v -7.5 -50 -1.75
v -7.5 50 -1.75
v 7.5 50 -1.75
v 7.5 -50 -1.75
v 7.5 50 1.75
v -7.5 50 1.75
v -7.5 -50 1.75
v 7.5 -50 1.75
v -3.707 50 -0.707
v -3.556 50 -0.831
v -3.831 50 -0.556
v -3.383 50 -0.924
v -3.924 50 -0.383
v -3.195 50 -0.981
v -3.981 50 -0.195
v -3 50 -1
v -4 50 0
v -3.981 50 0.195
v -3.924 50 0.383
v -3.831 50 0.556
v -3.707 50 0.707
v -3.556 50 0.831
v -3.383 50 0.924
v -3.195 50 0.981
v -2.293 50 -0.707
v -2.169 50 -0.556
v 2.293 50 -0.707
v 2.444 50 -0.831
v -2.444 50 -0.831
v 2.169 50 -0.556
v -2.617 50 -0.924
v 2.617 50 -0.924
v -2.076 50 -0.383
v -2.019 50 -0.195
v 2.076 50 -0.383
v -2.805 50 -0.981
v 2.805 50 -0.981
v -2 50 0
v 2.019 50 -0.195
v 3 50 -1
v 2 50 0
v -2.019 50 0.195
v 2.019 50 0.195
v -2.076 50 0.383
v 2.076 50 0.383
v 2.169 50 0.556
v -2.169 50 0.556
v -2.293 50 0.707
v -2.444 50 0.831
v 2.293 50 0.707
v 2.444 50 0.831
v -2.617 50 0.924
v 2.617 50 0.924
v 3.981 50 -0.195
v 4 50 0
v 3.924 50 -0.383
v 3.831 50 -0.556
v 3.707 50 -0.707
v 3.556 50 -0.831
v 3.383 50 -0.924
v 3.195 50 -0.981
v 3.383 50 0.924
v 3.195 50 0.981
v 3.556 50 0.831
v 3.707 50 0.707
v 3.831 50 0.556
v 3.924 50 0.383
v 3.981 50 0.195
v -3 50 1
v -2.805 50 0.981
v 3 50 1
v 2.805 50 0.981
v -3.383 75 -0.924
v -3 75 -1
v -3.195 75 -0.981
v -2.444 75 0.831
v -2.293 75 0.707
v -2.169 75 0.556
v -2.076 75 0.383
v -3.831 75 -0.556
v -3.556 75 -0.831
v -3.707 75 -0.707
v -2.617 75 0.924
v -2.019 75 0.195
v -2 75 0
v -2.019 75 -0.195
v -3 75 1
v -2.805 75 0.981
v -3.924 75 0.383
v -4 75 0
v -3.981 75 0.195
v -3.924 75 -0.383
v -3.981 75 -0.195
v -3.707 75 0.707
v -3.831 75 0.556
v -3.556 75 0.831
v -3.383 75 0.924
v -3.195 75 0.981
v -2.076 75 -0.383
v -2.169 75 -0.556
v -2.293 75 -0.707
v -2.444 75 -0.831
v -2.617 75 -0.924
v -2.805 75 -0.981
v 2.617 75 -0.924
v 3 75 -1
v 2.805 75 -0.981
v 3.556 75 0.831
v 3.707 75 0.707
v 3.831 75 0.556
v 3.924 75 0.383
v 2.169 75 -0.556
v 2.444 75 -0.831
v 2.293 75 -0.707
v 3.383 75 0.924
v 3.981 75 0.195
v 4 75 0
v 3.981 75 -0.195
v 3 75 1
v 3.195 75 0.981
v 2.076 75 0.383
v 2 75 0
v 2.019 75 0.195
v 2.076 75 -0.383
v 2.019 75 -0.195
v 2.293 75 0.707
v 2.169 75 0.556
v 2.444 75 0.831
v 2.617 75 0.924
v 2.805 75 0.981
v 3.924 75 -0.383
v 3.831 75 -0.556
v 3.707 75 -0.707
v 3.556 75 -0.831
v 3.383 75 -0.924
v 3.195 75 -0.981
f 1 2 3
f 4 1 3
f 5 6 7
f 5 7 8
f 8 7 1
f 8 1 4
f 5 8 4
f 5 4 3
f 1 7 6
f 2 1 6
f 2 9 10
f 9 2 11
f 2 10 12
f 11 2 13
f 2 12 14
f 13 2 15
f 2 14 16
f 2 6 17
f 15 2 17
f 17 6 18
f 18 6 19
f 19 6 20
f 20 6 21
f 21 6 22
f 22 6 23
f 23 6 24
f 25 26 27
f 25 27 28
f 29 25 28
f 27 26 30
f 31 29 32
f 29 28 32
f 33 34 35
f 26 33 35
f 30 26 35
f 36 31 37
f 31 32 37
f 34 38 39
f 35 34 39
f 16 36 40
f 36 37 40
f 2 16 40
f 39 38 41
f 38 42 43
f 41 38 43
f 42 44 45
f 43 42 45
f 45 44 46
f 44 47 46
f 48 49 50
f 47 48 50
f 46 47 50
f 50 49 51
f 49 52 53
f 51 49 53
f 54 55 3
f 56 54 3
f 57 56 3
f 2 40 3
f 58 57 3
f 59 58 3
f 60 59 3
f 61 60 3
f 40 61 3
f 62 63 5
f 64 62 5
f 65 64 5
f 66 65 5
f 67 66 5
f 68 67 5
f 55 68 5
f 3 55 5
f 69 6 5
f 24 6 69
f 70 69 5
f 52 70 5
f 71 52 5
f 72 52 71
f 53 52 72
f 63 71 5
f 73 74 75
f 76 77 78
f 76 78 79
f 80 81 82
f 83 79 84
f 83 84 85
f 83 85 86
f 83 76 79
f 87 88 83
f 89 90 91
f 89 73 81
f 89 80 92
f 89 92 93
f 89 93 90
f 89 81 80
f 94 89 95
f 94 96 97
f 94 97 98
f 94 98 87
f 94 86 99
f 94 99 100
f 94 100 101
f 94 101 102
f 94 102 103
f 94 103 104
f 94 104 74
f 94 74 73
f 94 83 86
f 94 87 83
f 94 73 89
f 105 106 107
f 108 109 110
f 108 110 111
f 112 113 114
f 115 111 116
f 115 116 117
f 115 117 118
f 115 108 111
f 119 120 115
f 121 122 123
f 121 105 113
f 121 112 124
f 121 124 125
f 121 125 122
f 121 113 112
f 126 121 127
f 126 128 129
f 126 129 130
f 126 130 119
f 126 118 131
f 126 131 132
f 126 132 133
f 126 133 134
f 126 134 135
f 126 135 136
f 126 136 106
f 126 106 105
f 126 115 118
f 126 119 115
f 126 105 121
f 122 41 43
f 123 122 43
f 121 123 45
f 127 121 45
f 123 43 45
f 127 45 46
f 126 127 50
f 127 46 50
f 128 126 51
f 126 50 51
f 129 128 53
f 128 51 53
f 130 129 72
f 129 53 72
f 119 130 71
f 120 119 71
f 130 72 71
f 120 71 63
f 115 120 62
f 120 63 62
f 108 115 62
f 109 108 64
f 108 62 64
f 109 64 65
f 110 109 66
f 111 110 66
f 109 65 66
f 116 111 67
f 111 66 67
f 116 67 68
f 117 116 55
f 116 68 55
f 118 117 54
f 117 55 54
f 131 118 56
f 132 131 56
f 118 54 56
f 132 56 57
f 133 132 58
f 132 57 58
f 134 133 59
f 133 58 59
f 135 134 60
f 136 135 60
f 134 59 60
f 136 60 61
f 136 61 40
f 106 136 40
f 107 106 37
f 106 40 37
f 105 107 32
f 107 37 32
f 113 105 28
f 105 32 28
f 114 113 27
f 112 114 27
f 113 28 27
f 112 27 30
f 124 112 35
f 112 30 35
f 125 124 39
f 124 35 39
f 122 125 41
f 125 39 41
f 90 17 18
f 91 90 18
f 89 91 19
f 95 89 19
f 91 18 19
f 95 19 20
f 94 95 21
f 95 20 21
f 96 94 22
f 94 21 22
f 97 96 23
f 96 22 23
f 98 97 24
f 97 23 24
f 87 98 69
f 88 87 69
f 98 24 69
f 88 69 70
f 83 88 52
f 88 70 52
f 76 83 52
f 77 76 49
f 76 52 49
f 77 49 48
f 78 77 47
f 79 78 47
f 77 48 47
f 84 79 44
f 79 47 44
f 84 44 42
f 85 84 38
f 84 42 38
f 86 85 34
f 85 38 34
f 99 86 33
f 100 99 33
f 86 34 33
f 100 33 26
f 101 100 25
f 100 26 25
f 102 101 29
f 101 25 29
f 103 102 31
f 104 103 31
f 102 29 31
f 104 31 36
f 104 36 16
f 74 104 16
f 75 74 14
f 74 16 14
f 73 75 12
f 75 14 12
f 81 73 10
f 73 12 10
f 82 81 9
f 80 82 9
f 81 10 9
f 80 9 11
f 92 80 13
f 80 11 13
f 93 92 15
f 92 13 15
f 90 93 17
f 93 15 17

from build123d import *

# Parameters (mm, degrees)
F0_W     = 15
F0_H     = 100
F1_DEPTH = 1.75
F2_R     = 1
F3_DEPTH = 25


with BuildPart() as f1:
    # F0 (on Top) → F1 (new body, symmetric)
    with BuildSketch(Plane.XY):
        Rectangle(F0_W, F0_H)
    extrude(amount=F1_DEPTH, both=True)

    # F2 (on face) → F3 (join)
    with BuildSketch(Plane(origin=(0, 50, 0), x_dir=(-1, 0, 0), z_dir=(0, 1, 0))):
        with Locations((3, 0)):
            Circle(F2_R)
        with Locations((-3, 0)):
            Circle(F2_R)
    extrude(amount=F3_DEPTH)


solid = f1.part
